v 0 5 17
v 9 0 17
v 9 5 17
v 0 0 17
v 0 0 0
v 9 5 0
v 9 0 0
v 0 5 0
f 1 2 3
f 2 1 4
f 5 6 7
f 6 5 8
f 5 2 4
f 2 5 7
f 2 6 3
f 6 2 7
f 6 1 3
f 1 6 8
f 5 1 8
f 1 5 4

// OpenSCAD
// Generated by SolidPython 1.0.1 on 2020-07-29 00:46:55


cube(size = [9, 5, 17]);
/***********************************************
*********      SolidPython code:      **********
************************************************
 
# import packages: SolidPython
from solid import *
from solid.utils import *
from itertools import chain, combinations, permutations


class Resize:

    def __init__(self, scad_file):
        self.scad_file = scad_file
        #self.scad_file = import_scad(scad_file)
        # cone/cylinder param:
        self.r1 = 0
        self.r2 = 0
        self.h = 0
        # rectangular prism param:
        self.w = 0
        self.l = 0
        # ellipse param:
        self.r = 0

    # import OpenScad code (file name corresponds to shape)


    # classify shape + parameters
    def assign(self, param1, param2, param3):
        if self.scad_file == 'cone.scad':
            self.r1 = param1
            self.r2 = param2
            self.h = param3
        elif self.scad_file == 'cylinder.scad':
            self.r1 = param1
            self.r2 = param2
            self.h = param3
        elif self.scad_file == 'rectangularPrism.scad':
            self.h = param1
            self.l = param2
            self.w = param3
        else:
            self.r = param1
            self.h = param2

    # resize parameters
    def iterate(self):
        x = range(3, 20, 2)
        i = 1
        if self.scad_file == 'cone.scad':
            tempList = list(permutations(x, 2))
            for temp in tempList:
                param1 = temp[0]
                param2 = temp[1]
                filepath = 'produced_scad_files/' + 'cone' + str(param1) + '_' + str(param2) + '_' + '.scad'
                scad_render_to_file(cylinder(h=param1, r1=param2, r2=0), filepath)

        elif self.scad_file == 'cylinder.scad':
            tempList = list(permutations(x, 3))
            for temp in tempList:
                param1 = temp[0]
                param2 = temp[1]
                filepath = 'produced_scad_files/' + 'cylinder' + str(param1) + '_' + str(param2) + '_' + '.scad'
                scad_render_to_file(cylinder(h=param1, r1=param2, r2=param2), filepath)

        elif self.scad_file == 'rectangularPrism.scad':
            tempList = list(permutations(x, 3))
            for temp in tempList:
                param1 = temp[0]
                param2 = temp[1]
                param3 = temp[2]
                filepath = 'produced_scad_files/' + 'rectangularPrism' + str(param1) + '_' + str(param2) + '_' + str(
                    param3) + '.scad'
                scad_render_to_file(cube(size=(param1, param2, param3)), filepath)

        elif self.scad_file == 'ellipse.scad':
            tempList = list(permutations(x, 4))
            for temp in tempList:
                param1 = temp[0]
                param2 = temp[1]
                param3 = temp[2]
                param4 = temp[3]
                filepath = 'produced_scad_files/' + 'ellipse' + str(param1) + '_' + str(param2) + '_' + str(param3) + '_' + str(param4) + '.scad'
                scad_render_to_file(scale([param1, param2, param3])(sphere(r=param4)), filepath)

    def render_to_scadfile(self):
        scad_render_to_file(scad, 'example.scad') 
 
************************************************/
